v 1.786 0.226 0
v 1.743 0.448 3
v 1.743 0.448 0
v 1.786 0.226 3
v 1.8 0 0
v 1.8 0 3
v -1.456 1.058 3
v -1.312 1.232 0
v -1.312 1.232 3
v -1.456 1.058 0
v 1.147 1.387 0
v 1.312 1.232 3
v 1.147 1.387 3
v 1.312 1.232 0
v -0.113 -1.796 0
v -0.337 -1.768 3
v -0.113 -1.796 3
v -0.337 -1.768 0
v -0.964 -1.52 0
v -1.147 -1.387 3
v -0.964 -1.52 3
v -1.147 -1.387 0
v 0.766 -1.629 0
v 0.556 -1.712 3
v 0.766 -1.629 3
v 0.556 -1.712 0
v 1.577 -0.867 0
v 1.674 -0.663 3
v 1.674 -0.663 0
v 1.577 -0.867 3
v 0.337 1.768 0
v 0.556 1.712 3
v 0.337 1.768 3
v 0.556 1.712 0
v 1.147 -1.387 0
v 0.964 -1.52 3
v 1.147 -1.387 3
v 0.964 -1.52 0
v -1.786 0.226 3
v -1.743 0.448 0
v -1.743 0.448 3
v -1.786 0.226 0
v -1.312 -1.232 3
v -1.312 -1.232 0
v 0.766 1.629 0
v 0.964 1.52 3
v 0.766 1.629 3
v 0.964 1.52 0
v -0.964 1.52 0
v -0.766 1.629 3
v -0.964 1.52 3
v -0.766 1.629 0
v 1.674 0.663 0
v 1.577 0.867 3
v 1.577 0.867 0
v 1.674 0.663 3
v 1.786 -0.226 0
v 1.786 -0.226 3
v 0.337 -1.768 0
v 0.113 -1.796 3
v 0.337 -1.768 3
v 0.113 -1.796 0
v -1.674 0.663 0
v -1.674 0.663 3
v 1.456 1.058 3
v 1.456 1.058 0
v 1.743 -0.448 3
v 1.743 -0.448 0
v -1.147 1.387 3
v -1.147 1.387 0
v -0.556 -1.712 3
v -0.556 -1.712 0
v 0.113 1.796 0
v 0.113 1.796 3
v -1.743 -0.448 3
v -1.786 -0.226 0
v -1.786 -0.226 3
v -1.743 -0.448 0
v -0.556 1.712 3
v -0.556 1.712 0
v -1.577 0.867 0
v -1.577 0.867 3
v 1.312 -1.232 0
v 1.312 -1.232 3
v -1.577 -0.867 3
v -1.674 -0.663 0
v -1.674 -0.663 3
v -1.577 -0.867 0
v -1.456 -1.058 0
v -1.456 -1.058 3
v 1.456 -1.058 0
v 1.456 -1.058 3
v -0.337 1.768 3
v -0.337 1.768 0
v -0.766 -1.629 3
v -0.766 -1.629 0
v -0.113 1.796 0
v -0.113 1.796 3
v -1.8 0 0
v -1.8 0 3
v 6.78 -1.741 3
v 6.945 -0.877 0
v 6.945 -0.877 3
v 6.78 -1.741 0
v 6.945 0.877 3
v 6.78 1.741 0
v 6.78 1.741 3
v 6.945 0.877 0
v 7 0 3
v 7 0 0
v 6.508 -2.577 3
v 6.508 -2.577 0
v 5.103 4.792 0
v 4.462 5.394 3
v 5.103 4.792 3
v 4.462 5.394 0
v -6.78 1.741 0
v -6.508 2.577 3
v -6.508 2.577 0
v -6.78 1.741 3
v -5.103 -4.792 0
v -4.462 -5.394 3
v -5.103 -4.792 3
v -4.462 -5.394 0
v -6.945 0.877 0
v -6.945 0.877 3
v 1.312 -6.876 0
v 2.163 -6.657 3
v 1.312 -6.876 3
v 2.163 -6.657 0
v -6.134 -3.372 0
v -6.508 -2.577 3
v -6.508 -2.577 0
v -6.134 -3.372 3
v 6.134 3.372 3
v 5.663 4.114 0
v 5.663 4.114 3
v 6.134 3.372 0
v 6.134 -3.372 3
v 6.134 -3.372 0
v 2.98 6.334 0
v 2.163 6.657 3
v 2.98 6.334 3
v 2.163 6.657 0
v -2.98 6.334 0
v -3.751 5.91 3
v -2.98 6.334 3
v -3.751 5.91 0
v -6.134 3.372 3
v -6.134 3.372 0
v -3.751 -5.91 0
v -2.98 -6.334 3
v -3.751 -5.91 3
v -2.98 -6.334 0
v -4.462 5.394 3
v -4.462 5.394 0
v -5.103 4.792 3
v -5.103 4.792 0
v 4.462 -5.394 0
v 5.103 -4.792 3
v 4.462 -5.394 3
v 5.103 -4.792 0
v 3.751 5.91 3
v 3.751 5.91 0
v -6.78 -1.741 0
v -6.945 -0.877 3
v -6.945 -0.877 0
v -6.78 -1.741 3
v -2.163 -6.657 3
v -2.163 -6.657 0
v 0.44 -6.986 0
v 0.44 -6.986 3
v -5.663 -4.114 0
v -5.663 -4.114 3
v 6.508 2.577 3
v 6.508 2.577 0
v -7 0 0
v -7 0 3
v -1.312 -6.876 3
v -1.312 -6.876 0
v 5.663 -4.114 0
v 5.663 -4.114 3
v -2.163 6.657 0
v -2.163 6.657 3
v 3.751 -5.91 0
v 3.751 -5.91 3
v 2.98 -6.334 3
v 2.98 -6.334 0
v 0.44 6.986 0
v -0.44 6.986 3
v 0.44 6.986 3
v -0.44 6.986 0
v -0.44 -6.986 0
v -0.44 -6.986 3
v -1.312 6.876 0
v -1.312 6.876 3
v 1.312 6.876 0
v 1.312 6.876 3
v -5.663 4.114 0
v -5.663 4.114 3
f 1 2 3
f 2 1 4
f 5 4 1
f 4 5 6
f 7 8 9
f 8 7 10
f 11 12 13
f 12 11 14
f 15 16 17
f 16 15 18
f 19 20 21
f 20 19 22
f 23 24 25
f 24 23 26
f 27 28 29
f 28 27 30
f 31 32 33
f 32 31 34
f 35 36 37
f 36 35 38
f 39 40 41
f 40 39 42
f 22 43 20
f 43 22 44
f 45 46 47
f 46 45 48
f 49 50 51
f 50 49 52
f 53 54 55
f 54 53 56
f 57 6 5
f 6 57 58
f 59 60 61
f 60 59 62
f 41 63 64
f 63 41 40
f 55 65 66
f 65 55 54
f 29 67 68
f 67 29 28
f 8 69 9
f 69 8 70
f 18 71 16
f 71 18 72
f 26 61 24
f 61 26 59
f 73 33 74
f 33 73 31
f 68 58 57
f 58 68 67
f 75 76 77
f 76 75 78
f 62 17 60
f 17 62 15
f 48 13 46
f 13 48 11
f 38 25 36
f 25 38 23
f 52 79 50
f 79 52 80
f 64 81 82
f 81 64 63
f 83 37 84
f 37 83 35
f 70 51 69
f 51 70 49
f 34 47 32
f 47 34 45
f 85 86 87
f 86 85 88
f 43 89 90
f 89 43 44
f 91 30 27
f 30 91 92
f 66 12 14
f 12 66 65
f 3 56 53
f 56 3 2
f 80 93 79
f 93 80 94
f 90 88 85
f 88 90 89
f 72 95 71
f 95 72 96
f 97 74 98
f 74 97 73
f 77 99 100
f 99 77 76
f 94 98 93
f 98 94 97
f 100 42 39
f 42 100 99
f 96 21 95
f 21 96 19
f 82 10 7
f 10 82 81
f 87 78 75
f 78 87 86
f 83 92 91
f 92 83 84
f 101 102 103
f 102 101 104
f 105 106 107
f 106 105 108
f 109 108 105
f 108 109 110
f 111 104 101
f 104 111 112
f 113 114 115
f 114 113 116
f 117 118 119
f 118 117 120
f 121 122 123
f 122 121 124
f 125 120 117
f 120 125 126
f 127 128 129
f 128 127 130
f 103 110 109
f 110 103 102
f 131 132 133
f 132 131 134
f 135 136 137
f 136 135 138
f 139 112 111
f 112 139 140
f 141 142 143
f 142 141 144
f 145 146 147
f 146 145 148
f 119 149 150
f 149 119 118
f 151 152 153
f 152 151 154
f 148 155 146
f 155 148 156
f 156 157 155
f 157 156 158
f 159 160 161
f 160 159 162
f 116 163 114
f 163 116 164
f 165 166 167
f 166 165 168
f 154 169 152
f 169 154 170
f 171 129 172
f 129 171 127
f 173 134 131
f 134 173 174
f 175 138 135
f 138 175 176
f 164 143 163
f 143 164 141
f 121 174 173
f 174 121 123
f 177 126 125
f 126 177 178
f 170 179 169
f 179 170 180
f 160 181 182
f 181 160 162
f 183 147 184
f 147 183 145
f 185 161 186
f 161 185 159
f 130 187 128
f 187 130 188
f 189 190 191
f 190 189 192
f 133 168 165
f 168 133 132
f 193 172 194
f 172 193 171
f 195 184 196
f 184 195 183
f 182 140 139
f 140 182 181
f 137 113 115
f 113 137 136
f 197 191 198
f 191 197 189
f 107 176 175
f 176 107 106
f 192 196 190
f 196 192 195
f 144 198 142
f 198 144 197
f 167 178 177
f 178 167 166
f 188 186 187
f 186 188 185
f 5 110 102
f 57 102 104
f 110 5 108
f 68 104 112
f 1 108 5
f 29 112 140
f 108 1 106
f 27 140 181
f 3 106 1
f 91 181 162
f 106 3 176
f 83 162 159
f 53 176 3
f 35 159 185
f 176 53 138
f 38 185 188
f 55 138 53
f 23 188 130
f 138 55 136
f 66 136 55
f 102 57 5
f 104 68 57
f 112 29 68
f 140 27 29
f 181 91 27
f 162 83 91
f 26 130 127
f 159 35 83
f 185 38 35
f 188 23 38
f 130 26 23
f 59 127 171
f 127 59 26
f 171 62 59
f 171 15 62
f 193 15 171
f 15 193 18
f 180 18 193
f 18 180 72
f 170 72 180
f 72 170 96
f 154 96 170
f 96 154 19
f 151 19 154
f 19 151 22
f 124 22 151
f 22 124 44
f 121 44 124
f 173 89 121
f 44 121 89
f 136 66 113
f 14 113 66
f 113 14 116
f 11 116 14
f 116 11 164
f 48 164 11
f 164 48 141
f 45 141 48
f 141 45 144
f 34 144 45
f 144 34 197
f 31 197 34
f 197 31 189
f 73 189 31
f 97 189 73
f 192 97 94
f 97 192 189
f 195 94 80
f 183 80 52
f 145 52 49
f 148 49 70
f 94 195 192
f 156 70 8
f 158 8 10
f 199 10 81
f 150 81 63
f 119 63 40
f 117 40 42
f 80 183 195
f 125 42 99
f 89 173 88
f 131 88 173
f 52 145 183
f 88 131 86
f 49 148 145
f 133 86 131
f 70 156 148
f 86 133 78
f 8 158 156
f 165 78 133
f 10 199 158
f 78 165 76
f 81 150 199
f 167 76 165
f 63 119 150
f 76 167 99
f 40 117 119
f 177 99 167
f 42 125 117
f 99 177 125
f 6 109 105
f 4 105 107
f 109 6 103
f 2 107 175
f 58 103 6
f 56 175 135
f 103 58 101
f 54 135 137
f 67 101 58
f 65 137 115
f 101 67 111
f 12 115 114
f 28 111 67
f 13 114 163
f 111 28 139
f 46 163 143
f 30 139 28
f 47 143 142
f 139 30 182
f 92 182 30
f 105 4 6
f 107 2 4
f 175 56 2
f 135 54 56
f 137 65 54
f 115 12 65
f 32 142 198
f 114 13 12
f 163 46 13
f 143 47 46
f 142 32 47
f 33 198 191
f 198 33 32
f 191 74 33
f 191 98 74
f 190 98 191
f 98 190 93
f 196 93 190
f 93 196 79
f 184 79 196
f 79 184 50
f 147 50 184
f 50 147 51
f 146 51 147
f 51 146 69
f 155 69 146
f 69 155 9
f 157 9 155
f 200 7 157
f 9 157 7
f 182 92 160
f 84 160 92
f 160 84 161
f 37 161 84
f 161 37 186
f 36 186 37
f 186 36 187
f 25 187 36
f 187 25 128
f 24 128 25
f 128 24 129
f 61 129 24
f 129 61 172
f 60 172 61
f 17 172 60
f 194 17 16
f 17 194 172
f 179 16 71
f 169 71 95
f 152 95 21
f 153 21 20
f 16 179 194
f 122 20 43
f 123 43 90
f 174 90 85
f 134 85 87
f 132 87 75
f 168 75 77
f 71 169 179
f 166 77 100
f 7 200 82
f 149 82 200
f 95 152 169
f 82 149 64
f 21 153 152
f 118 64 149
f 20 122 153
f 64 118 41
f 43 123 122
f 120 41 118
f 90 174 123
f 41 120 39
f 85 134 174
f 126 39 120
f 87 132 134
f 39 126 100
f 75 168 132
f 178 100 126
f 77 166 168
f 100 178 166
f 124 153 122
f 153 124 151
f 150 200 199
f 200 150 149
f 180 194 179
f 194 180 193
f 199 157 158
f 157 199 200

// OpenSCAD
$fn = 50;


difference() {
	union() {
		cylinder(h = 3, r = 7.0000000000);
	}
	union() {
		translate(v = [0, 0, -100]) {
			cylinder(h = 200, r = 1.8000000000);
		}
		translate(v = [0, 0, -100]) {
			cylinder(h = 200, r = 1.8000000000);
		}
	}
}
